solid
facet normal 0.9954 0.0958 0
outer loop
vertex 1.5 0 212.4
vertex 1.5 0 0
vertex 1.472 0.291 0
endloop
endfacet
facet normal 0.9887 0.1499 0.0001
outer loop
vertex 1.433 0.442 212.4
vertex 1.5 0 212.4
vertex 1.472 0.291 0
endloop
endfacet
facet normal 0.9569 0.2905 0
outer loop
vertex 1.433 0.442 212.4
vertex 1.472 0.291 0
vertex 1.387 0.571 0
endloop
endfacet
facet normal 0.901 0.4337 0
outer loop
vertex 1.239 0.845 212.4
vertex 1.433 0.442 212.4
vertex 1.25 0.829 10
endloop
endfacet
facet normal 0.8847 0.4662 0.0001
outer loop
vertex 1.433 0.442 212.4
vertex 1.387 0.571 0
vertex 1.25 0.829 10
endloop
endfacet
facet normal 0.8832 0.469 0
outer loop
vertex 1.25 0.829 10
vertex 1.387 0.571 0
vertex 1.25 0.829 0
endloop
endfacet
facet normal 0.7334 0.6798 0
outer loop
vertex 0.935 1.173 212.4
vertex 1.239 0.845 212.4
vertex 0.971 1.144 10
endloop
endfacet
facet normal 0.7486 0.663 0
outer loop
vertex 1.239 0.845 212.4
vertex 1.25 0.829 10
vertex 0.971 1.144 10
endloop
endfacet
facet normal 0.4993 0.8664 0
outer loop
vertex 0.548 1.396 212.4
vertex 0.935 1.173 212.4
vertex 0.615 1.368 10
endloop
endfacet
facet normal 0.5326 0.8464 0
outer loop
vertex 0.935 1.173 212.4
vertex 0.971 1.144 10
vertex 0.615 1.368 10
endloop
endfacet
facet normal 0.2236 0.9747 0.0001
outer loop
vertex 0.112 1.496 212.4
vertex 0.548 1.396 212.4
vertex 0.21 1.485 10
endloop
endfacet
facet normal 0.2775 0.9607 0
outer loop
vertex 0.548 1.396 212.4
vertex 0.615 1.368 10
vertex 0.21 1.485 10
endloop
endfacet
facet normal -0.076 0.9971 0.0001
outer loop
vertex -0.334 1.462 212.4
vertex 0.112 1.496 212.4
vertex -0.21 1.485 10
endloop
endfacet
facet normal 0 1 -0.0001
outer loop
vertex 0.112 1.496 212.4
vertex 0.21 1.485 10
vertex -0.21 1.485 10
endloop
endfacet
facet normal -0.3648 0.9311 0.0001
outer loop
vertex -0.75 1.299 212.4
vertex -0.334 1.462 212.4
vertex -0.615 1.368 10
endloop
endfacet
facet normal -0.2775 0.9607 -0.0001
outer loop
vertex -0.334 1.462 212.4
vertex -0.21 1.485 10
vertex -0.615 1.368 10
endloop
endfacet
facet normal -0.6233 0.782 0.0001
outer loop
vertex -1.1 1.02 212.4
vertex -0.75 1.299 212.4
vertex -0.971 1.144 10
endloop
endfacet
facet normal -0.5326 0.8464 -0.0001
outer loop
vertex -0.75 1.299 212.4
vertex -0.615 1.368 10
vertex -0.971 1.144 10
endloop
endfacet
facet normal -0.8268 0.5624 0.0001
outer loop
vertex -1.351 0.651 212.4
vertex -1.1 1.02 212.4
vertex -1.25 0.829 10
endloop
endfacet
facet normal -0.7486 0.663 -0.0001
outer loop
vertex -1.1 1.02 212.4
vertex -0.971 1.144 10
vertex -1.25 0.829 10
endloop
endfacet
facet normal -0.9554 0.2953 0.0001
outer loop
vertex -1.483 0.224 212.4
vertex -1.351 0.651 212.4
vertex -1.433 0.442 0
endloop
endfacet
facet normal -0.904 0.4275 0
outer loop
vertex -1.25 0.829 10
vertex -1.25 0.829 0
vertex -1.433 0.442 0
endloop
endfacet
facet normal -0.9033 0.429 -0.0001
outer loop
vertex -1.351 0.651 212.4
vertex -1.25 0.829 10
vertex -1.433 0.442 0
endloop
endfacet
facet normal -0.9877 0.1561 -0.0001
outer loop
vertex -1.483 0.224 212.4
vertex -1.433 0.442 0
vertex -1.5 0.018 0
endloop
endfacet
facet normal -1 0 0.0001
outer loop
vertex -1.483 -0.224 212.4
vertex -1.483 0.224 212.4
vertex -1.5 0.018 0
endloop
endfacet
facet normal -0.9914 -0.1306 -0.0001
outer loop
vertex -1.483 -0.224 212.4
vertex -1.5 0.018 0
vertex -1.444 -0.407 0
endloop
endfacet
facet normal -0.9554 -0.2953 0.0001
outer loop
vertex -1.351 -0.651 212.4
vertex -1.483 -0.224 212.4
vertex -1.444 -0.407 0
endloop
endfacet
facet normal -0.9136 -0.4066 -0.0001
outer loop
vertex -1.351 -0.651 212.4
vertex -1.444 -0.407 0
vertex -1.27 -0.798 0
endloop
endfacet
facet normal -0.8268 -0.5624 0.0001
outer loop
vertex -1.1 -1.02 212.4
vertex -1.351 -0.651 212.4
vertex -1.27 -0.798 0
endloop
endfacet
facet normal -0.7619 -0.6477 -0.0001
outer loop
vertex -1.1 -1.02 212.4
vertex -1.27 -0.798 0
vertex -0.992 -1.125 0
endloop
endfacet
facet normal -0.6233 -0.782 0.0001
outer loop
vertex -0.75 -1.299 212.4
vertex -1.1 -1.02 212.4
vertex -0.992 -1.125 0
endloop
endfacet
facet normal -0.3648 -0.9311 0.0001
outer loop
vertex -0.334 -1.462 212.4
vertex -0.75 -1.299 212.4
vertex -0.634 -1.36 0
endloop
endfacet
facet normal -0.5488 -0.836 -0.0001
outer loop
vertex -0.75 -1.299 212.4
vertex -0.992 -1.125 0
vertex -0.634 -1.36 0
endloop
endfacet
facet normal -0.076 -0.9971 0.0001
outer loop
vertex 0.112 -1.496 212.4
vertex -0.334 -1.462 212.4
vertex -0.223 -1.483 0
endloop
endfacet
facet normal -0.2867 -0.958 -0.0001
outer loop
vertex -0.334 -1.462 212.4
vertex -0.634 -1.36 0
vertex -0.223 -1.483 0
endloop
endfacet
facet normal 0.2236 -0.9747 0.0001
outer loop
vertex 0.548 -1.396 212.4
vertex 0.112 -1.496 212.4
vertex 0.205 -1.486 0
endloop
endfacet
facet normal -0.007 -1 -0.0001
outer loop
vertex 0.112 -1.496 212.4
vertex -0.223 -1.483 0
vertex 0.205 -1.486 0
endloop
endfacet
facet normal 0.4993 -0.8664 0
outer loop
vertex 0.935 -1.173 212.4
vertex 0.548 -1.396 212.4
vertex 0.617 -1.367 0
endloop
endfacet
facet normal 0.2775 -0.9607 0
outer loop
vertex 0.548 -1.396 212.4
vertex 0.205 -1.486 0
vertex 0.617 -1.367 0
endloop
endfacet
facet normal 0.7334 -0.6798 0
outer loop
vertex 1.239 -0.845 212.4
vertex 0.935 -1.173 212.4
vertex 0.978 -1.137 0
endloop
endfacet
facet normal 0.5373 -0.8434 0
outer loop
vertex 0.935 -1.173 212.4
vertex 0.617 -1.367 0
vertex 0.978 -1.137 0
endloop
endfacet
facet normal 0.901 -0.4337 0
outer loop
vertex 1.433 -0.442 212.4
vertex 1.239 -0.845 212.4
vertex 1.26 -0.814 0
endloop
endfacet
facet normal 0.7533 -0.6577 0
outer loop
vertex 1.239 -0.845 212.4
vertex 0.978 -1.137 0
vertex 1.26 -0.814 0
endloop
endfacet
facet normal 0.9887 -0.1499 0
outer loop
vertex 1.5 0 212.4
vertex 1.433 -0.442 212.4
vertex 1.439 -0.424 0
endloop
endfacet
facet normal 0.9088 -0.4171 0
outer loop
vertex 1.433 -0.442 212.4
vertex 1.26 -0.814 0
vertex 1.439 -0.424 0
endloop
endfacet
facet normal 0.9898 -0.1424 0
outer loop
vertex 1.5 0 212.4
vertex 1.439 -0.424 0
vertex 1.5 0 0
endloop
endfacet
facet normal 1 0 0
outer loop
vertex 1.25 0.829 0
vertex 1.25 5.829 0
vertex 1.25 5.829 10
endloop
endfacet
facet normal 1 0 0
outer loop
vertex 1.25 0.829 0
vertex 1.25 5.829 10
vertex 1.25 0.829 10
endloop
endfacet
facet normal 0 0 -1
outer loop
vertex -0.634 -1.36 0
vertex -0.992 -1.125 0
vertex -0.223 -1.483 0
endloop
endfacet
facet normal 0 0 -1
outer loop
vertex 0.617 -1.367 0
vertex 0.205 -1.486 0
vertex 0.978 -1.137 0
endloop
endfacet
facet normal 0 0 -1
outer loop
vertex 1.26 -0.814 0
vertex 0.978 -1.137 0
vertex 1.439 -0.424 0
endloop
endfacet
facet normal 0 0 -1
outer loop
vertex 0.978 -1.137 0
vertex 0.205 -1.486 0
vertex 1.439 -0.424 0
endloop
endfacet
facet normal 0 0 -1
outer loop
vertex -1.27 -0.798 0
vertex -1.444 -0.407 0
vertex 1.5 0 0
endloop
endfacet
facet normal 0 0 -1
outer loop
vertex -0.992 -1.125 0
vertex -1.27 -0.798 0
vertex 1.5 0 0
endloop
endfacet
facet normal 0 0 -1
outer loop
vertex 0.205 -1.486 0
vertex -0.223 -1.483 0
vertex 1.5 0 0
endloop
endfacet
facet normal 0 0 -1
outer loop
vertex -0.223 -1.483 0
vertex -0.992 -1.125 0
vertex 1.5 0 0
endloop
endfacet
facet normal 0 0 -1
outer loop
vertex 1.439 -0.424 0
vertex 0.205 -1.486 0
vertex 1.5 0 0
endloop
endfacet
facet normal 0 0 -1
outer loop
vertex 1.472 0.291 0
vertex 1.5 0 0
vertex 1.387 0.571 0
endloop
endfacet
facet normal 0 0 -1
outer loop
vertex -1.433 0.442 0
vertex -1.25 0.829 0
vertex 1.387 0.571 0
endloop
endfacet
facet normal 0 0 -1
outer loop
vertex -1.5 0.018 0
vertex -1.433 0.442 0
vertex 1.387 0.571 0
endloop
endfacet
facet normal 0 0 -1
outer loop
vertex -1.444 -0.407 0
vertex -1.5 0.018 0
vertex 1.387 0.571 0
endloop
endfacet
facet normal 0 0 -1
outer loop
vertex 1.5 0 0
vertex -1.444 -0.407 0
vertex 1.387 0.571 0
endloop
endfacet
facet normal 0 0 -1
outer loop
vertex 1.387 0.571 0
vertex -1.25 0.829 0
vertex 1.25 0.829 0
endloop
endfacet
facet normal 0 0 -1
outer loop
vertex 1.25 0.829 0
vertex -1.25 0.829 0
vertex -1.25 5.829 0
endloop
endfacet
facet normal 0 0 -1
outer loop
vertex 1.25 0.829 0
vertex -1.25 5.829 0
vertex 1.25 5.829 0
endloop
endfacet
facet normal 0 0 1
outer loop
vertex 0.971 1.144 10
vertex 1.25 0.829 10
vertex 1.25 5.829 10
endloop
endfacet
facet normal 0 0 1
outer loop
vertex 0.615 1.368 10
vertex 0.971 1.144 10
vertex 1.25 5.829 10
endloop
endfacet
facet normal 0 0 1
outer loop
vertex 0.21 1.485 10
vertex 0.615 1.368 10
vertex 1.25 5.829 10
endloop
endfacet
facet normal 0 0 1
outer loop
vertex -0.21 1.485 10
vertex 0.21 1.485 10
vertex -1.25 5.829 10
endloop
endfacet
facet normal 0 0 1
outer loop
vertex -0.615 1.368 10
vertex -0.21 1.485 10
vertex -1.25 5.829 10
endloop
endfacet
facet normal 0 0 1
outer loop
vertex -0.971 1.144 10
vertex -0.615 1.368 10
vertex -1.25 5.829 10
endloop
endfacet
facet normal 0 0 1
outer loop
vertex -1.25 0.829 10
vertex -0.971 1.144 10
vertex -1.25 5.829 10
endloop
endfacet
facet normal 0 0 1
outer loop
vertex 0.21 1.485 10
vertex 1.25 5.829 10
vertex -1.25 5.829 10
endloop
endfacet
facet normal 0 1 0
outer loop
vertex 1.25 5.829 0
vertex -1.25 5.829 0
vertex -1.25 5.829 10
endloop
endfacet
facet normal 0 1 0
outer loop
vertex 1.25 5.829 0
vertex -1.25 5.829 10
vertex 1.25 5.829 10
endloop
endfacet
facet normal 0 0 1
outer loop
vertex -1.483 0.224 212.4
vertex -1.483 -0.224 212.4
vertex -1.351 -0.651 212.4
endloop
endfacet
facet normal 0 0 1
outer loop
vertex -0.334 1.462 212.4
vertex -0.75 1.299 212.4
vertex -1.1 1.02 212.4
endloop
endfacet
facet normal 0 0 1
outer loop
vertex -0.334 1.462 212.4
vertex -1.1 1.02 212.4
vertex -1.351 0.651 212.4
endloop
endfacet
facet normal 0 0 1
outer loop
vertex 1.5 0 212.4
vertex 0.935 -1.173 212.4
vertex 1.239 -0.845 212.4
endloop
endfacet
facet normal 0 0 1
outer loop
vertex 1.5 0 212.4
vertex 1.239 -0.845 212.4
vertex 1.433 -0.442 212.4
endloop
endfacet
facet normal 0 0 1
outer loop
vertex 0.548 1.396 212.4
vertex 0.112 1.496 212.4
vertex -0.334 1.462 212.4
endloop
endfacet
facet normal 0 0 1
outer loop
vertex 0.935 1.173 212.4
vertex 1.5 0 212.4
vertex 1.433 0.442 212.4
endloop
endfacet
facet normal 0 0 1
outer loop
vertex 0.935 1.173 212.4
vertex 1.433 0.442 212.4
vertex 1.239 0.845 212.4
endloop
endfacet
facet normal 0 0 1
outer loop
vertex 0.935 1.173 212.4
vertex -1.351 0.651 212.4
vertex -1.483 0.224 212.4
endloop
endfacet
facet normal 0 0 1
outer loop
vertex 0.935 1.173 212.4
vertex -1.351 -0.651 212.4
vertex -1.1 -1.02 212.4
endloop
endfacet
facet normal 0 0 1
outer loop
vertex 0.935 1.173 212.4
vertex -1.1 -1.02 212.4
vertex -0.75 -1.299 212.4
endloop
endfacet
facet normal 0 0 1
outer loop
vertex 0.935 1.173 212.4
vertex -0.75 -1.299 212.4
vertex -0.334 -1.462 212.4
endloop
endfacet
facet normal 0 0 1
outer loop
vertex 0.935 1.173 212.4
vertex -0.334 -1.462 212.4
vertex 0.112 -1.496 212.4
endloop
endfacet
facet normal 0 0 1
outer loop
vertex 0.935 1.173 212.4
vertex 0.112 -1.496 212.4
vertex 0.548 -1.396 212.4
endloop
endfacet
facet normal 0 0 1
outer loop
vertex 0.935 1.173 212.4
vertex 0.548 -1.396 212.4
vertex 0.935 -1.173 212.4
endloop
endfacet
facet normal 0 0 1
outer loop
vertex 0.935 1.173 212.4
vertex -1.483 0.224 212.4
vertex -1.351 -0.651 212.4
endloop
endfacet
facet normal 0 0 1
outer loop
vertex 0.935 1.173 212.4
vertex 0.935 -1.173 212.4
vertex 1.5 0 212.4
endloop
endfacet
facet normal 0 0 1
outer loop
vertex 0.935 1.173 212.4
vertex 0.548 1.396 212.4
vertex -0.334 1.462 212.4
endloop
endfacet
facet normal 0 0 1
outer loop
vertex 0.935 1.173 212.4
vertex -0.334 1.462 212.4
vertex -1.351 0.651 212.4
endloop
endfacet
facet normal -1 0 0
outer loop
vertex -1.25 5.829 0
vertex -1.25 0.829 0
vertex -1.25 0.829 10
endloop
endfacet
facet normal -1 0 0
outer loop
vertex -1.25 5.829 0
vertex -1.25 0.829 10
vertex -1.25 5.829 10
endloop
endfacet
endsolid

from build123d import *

# Parameters (mm, degrees)
SKETCH1_R           = 1.5
BOSS_EXTRUDE1_DEPTH = 212.4
BOSS_EXTRUDE2_DEPTH = 10


with BuildPart() as part:
    # Sketch1 → Boss-Extrude1 (new body)
    with BuildSketch(Plane.XY):
        Circle(SKETCH1_R)
    extrude(amount=BOSS_EXTRUDE1_DEPTH)

    # Sketch2 → Boss-Extrude2 (add)
    with BuildSketch(Plane(origin=(0, 0, 0), x_dir=(-1, 0, 0), z_dir=(0, 0, -1))):
        with BuildLine():
            Line((-1.25, 5.829156198), (-1.25, 0.829156198))
            ThreePointArc((-1.25, 0.829156198), (0, 1.5), (1.25, 0.829156198))
            Line((1.25, 0.829156198), (1.25, 5.829156198))
            Line((1.25, 5.829156198), (-1.25, 5.829156198))
        make_face()
    extrude(amount=-BOSS_EXTRUDE2_DEPTH)


solid = part.part
